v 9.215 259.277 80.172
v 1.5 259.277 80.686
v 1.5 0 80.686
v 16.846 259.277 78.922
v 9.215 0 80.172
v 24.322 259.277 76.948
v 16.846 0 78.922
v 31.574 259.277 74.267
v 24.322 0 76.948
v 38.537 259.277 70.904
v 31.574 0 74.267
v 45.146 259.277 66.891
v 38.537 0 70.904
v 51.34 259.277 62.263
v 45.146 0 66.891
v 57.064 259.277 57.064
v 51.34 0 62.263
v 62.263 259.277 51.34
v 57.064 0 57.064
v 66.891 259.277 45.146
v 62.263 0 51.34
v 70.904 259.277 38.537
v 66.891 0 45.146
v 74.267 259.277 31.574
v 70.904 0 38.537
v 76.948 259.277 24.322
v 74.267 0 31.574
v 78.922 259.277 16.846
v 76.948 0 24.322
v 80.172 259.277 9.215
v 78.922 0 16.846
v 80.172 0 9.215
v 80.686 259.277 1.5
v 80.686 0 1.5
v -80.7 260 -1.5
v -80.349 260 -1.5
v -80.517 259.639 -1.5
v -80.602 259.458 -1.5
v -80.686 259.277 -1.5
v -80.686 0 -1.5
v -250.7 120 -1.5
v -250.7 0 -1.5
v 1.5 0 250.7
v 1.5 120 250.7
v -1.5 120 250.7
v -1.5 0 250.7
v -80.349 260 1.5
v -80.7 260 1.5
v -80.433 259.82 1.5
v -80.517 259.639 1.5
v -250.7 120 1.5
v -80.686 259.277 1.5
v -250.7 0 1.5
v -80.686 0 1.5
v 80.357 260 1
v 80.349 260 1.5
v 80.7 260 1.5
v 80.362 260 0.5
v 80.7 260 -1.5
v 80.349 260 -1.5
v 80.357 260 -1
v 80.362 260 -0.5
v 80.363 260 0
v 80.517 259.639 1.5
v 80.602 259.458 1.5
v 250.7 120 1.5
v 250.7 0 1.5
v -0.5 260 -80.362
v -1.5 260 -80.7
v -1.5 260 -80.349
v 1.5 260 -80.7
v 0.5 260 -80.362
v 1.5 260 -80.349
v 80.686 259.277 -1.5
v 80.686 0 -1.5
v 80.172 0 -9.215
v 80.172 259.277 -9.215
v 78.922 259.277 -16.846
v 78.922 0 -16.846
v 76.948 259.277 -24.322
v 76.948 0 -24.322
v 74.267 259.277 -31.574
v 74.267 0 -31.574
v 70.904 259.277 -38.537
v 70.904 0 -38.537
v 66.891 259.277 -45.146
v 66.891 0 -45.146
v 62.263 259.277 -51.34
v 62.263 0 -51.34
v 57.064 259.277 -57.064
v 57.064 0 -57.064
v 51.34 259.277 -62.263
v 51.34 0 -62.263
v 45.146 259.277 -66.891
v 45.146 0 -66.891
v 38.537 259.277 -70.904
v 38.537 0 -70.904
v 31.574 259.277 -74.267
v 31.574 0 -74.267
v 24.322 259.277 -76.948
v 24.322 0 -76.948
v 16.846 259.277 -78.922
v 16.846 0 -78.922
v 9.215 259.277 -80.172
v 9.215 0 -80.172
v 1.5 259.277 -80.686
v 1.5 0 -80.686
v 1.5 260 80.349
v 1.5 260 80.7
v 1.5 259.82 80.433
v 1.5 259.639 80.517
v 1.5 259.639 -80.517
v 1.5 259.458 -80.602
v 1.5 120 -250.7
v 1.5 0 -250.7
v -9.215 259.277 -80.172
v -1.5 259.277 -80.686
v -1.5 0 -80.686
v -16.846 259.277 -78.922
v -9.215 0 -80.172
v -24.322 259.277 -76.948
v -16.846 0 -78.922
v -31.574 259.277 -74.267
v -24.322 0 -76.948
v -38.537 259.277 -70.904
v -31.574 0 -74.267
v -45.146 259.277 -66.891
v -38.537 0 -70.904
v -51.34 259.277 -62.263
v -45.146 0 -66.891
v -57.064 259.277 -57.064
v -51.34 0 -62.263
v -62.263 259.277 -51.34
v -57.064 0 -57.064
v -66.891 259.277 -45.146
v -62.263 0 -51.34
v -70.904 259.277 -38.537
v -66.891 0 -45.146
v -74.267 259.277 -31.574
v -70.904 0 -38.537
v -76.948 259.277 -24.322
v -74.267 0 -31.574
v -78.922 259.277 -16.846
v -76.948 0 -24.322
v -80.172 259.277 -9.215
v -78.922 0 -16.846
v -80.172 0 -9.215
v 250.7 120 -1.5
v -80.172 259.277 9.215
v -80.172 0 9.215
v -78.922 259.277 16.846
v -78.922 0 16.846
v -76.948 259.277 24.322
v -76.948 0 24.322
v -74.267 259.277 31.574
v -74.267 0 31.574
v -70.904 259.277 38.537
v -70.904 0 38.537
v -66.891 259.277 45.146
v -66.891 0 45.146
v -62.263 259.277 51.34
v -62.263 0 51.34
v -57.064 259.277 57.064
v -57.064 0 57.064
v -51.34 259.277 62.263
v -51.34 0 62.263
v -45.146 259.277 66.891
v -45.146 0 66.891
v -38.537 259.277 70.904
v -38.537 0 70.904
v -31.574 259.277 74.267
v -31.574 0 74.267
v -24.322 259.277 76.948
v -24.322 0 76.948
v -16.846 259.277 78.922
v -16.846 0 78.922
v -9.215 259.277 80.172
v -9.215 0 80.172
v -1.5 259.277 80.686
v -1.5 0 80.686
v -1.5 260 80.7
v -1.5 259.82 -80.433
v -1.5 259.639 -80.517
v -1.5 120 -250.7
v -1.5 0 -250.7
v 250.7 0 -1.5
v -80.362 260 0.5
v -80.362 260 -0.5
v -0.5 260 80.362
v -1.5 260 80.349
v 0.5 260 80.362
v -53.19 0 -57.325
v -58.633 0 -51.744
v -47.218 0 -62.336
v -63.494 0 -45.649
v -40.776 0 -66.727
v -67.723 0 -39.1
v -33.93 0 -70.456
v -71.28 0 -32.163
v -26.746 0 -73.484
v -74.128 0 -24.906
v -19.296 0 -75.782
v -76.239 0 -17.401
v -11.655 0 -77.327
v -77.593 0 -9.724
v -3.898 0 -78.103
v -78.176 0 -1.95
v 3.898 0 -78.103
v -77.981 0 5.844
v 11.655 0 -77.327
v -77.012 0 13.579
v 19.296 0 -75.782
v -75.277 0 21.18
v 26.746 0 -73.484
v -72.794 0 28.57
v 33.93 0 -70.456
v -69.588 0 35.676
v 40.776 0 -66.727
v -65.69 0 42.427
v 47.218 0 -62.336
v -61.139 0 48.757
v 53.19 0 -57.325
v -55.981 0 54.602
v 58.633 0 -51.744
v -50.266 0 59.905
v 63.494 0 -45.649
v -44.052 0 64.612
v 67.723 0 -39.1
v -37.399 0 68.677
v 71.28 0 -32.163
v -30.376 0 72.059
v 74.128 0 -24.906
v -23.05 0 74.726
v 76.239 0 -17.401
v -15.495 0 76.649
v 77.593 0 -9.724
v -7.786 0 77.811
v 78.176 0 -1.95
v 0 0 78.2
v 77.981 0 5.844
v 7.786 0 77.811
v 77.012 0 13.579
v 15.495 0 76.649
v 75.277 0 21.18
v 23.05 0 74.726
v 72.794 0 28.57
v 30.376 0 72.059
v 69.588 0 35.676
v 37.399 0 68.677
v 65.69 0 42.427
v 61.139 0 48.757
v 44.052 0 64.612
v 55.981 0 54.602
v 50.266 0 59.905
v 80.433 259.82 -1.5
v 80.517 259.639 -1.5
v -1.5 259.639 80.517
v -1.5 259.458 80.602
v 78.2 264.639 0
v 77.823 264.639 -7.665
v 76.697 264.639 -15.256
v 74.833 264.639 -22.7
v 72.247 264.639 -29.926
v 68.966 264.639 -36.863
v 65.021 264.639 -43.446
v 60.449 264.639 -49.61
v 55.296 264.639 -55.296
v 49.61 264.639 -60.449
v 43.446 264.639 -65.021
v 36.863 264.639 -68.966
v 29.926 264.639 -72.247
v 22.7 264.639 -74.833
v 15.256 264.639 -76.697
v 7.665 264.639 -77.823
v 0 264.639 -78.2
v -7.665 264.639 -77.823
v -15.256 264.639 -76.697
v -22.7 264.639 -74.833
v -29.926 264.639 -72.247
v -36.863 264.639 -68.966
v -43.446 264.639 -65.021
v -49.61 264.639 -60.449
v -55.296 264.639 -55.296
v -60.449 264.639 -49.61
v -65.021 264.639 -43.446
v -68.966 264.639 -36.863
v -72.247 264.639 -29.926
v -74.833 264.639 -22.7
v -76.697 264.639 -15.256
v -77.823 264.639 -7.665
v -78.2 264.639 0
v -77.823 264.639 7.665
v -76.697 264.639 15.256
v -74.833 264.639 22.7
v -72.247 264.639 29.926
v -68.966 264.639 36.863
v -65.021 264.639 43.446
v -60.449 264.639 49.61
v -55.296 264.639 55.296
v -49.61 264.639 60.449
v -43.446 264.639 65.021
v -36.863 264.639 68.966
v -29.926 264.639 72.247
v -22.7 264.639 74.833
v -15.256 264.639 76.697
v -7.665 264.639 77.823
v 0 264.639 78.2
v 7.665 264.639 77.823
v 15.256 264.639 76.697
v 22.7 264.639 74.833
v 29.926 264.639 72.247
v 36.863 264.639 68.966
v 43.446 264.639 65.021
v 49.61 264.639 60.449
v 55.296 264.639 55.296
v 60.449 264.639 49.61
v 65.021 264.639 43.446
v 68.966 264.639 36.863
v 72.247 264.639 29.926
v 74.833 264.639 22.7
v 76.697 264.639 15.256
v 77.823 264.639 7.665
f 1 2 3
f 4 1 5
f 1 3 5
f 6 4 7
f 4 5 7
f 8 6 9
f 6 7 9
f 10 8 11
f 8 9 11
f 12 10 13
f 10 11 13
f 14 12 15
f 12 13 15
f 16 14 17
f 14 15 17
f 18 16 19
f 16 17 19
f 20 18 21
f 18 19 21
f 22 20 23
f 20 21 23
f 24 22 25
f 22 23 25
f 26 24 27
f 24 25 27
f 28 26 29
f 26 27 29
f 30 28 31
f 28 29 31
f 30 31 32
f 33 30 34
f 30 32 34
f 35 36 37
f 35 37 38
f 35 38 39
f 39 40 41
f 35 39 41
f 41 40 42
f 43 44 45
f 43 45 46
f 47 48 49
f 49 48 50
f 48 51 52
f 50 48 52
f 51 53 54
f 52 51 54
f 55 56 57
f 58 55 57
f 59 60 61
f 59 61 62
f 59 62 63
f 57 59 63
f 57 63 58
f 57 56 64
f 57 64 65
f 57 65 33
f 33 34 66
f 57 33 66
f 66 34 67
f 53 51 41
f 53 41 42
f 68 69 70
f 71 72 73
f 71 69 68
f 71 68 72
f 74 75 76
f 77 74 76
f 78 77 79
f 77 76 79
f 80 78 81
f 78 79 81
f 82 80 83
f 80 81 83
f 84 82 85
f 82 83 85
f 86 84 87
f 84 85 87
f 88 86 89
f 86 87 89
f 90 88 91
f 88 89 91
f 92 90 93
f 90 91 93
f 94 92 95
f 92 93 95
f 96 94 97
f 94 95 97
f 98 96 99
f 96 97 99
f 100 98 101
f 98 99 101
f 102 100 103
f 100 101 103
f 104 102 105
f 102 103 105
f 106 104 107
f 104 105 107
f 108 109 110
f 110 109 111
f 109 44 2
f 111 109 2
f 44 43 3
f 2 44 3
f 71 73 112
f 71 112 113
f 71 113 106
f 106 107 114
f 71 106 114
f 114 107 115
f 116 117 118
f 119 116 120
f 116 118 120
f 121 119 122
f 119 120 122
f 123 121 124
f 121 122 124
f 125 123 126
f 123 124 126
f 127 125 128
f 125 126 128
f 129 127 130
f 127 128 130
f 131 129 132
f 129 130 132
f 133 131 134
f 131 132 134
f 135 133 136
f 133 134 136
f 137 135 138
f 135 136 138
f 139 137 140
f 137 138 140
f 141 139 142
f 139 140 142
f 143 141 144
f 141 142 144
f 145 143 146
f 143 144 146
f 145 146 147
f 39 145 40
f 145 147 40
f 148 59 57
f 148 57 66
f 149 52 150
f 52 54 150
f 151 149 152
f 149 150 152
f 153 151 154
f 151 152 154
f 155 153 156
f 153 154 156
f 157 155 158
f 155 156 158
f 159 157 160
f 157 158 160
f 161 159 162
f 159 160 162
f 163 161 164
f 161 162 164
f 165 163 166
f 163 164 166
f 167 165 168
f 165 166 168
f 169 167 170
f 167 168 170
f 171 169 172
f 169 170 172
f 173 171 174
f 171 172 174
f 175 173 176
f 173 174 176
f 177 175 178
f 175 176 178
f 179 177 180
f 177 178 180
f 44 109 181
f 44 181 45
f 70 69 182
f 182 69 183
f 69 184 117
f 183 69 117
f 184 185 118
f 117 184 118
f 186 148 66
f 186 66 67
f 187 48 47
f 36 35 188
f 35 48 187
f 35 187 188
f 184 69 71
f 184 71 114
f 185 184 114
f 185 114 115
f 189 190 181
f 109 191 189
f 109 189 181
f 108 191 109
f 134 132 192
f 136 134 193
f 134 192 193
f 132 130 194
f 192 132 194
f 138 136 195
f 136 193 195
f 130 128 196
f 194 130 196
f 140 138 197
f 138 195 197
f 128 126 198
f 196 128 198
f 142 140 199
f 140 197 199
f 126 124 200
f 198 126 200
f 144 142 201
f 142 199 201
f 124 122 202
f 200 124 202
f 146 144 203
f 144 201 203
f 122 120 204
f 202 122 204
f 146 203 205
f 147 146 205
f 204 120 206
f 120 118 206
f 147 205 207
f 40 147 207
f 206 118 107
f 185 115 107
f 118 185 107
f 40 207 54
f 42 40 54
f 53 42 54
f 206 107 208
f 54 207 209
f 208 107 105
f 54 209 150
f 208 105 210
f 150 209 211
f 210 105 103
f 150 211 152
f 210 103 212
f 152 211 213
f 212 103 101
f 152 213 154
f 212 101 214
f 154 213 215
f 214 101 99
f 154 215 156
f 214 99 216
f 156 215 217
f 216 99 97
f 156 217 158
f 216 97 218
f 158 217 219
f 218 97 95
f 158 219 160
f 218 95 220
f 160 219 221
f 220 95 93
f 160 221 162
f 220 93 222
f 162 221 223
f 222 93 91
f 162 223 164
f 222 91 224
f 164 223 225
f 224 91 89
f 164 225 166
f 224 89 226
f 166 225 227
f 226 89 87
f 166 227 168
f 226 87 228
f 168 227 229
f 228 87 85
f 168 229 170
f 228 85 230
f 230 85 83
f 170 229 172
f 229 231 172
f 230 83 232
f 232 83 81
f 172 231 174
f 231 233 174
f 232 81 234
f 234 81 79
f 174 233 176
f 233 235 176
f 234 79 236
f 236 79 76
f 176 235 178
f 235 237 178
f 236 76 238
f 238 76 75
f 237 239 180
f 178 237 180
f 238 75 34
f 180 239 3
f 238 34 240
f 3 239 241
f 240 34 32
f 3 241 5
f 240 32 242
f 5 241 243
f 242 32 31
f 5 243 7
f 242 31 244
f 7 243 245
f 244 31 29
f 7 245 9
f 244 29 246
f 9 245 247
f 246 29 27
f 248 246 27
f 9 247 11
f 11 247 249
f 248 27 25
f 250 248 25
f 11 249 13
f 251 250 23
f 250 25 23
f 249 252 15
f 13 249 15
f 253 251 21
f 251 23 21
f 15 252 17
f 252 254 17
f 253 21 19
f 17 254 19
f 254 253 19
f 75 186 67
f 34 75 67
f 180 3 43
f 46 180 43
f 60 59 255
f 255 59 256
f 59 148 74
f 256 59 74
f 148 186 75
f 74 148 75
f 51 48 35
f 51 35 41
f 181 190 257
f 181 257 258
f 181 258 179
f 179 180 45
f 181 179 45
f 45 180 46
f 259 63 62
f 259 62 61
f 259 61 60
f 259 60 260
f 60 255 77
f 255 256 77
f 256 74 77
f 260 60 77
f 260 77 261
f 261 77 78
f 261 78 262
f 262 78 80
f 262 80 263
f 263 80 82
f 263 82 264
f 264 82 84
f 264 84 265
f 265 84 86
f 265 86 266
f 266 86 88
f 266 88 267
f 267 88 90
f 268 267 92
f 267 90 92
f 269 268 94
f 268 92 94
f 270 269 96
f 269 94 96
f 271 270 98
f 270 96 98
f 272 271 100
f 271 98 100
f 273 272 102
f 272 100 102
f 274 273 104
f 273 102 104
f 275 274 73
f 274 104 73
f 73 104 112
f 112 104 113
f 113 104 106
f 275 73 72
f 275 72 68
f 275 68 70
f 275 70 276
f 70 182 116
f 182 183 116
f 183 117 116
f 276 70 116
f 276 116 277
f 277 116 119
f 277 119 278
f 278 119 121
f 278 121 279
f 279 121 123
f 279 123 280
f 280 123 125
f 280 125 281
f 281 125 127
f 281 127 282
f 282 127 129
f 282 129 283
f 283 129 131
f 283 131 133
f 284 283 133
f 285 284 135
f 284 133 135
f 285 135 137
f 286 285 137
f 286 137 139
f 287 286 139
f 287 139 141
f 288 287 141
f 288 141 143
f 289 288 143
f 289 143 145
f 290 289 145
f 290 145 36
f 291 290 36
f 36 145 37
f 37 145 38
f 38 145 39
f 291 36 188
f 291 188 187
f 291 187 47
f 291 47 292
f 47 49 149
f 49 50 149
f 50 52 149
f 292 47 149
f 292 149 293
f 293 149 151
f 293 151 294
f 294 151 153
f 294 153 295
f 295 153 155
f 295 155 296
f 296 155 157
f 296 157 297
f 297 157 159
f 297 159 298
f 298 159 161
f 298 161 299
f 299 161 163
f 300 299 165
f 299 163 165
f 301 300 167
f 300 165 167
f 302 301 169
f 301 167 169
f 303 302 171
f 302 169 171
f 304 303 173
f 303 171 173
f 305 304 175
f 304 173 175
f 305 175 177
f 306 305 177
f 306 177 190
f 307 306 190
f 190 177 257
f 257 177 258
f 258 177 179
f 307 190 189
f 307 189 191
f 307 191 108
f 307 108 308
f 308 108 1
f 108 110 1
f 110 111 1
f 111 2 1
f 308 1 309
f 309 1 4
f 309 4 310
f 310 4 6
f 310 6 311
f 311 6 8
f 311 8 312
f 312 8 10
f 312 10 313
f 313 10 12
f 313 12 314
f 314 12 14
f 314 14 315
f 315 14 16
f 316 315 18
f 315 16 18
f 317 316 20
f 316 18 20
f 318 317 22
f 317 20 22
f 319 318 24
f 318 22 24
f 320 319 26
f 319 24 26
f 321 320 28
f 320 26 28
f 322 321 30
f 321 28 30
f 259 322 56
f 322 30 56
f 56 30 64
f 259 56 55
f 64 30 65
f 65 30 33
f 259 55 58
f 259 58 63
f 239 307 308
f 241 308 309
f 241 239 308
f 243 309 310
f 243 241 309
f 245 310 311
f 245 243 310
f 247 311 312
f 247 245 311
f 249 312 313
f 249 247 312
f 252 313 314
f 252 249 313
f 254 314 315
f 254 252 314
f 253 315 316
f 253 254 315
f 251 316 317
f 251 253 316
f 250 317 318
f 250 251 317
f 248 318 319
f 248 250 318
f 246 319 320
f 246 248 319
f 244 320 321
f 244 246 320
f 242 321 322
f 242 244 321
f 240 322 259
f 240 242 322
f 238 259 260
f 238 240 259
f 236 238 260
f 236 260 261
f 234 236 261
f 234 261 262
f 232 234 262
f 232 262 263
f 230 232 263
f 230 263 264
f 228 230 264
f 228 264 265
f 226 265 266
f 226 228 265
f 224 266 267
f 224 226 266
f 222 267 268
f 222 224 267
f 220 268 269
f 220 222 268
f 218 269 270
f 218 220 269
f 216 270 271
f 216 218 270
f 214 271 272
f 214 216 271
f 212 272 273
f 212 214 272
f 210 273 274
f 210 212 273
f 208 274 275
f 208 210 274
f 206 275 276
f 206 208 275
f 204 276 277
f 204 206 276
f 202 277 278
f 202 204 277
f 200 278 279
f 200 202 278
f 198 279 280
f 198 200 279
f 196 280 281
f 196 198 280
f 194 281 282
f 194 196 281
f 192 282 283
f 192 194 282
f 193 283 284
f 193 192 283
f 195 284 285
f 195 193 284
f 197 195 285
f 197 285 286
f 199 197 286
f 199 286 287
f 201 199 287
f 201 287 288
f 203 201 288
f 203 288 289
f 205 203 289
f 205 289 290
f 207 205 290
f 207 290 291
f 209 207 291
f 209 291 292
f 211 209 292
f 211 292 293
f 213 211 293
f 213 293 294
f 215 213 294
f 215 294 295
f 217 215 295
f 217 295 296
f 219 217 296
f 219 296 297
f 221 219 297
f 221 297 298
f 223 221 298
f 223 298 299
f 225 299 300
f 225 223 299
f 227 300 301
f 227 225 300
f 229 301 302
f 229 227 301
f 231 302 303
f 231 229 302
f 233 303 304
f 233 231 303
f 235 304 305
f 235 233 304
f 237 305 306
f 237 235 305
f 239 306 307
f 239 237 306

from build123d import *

# Parameters (mm, degrees)
SKETCH1_R                = 80.7
SKETCH1_R_2              = 78.2
BOSS_EXTRUDE1_DEPTH      = 260
BOSS_EXTRUDE2_DEPTH      = 1.5
BOSS_EXTRUDE2_DEPTH_BACK = 1.5
BOSS_EXTRUDE3_DEPTH      = 1.5
BOSS_EXTRUDE3_DEPTH_BACK = 1.5
SKETCH4_W                = 2
SKETCH4_H                = 260
CIRPATTERN1_COUNT        = 4
SKETCH6_R                = 78.2
BOSS_EXTRUDE4_DEPTH      = 10
CHAMFER1_START           = 264.638732699
CHAMFER1_2_OUTLINE_R     = 80.7
CHAMFER1_2_OUTLINE_R_2   = 78.2
CHAMFER1_2_DEPTH         = 5.361267301
CHAMFER1_START_2         = 258
CHAMFER1_3_DEPTH         = 2


with BuildPart() as part:
    # Sketch1 → Boss-Extrude1 (new body)
    with BuildSketch(Plane(origin=(0, 0, 0), x_dir=(1, 0, 0), z_dir=(0, 1, 0))):
        with Locations(Location((0, 0, 0), (0, 0, 270))):
            Circle(SKETCH1_R)
        with Locations(Location((0, 0, 0), (0, 0, 270))):
            Circle(SKETCH1_R_2, mode=Mode.SUBTRACT)
    extrude(amount=BOSS_EXTRUDE1_DEPTH)



with BuildPart() as body_2:
    # Sketch2 → Boss-Extrude2 (new, two sides: drawn at the far end of the back side and taken through both)
    with BuildSketch(Plane.XY.offset(-BOSS_EXTRUDE2_DEPTH_BACK)):
        Polygon((80.7, 0), (80.7, 260), (250.7, 120), (250.7, 0), align=None)
    extrude(amount=BOSS_EXTRUDE2_DEPTH + BOSS_EXTRUDE2_DEPTH_BACK)


with BuildPart() as part_1:
    add(part.part)

    add(body_2.part)  # Boss-Extrude3 merges body 2
    # Sketch4 → Boss-Extrude3 (add, two sides: drawn at the far end of the back side and taken through both)
    with BuildSketch(Plane.XY.offset(-BOSS_EXTRUDE3_DEPTH_BACK)):
        with Locations((79.7, 130)):
            Rectangle(SKETCH4_W, SKETCH4_H)
    extrude(amount=BOSS_EXTRUDE3_DEPTH + BOSS_EXTRUDE3_DEPTH_BACK)


with BuildPart() as cirpattern1_1:
    # CirPattern1: pattern copy
    add(part_1.part.rotate(Axis((0, 0, 0), (0, 1, 0)), 1 * 360 / CIRPATTERN1_COUNT))


with BuildPart() as cirpattern1_2:
    # CirPattern1: pattern copy
    add(part_1.part.rotate(Axis((0, 0, 0), (0, 1, 0)), 2 * 360 / CIRPATTERN1_COUNT))


with BuildPart() as cirpattern1_3:
    # CirPattern1: pattern copy
    add(part_1.part.rotate(Axis((0, 0, 0), (0, 1, 0)), 3 * 360 / CIRPATTERN1_COUNT))


with BuildPart() as part_2:
    add(part_1.part)

    add(cirpattern1_1.part)  # Boss-Extrude4 merges CirPattern1_1

    add(cirpattern1_2.part)  # Boss-Extrude4 merges CirPattern1_2

    add(cirpattern1_3.part)  # Boss-Extrude4 merges CirPattern1_3
    # Sketch6 → Boss-Extrude4 (add)
    with BuildSketch(Plane(origin=(0, 260, 0), x_dir=(1, 0, 0), z_dir=(0, 1, 0))):
        with BuildLine():
            ThreePointArc((80.686058275, -1.5), (80.7, 0), (80.686058275, 1.5))
            ThreePointArc((80.686058275, 1.5), (57.063517242, 57.063517242), (1.5, 80.686058275))
            ThreePointArc((1.5, 80.686058275), (0, 80.7), (-1.5, 80.686058275))
            ThreePointArc((-1.5, 80.686058275), (-57.063517242, -57.063517242), (80.686058275, -1.5))
        make_face()
        with Locations(Location((0, 0, 0), (0, 0, 270))):
            Circle(SKETCH6_R, mode=Mode.SUBTRACT)
    extrude(amount=BOSS_EXTRUDE4_DEPTH)

    # Chamfer1: read off the stored shape, not the designer's step
    # Chamfer1 outline → Chamfer1 (revolve, cut)
    with BuildSketch(Plane.XY):
        Polygon((78.2, 264.638732699), (80.7, 259.277465397), (80.7, 264.638732699), align=None)
    revolve(axis=Axis((0, 0, 0), (0, 1, 0)), mode=Mode.SUBTRACT)

    # Chamfer1 2 outline → Chamfer1 2 (cut)
    with BuildSketch(Plane(origin=(0, 0, 0), x_dir=(1, 0, 0), z_dir=(0, 1, 0)).offset(CHAMFER1_START)):
        Circle(CHAMFER1_2_OUTLINE_R)
        Circle(CHAMFER1_2_OUTLINE_R_2, mode=Mode.SUBTRACT)
    extrude(amount=CHAMFER1_2_DEPTH, mode=Mode.SUBTRACT)

    # Chamfer1 3 outline → Chamfer1 3 (add)
    with BuildSketch(Plane(origin=(0, 0, 0), x_dir=(1, 0, 0), z_dir=(0, 1, 0)).offset(CHAMFER1_START_2)):
        with BuildLine():
            ThreePointArc((80.686058275, -1.5), (80.7, 0), (80.686058275, 1.5))
            Line((80.686058275, 1.5), (80.349076396, 1.5))
            ThreePointArc((80.349076396, 1.5), (80.363076582, 0), (80.349076396, -1.5))
            Line((80.349076396, -1.5), (80.686058275, -1.5))
        make_face()
        with BuildLine():
            Line((1.5, 80.349076396), (1.5, 80.686058275))
            ThreePointArc((1.5, 80.686058275), (0, 80.7), (-1.5, 80.686058275))
            Line((-1.5, 80.686058275), (-1.5, 80.349076396))
            ThreePointArc((-1.5, 80.349076396), (0, 80.363076582), (1.5, 80.349076396))
        make_face()
        with BuildLine():
            ThreePointArc((-1.5, -80.686058275), (0, -80.7), (1.5, -80.686058275))
            Line((1.5, -80.686058275), (1.5, -80.349076396))
            ThreePointArc((1.5, -80.349076396), (0, -80.363076582), (-1.5, -80.349076396))
            Line((-1.5, -80.349076396), (-1.5, -80.686058275))
        make_face()
        with BuildLine():
            Line((-80.349076396, 1.5), (-80.686058275, 1.5))
            ThreePointArc((-80.686058275, 1.5), (-80.7, 0), (-80.686058275, -1.5))
            Line((-80.686058275, -1.5), (-80.349076396, -1.5))
            ThreePointArc((-80.349076396, -1.5), (-80.363076582, 0), (-80.349076396, 1.5))
        make_face()
    extrude(amount=CHAMFER1_3_DEPTH)


solid = part_2.part
